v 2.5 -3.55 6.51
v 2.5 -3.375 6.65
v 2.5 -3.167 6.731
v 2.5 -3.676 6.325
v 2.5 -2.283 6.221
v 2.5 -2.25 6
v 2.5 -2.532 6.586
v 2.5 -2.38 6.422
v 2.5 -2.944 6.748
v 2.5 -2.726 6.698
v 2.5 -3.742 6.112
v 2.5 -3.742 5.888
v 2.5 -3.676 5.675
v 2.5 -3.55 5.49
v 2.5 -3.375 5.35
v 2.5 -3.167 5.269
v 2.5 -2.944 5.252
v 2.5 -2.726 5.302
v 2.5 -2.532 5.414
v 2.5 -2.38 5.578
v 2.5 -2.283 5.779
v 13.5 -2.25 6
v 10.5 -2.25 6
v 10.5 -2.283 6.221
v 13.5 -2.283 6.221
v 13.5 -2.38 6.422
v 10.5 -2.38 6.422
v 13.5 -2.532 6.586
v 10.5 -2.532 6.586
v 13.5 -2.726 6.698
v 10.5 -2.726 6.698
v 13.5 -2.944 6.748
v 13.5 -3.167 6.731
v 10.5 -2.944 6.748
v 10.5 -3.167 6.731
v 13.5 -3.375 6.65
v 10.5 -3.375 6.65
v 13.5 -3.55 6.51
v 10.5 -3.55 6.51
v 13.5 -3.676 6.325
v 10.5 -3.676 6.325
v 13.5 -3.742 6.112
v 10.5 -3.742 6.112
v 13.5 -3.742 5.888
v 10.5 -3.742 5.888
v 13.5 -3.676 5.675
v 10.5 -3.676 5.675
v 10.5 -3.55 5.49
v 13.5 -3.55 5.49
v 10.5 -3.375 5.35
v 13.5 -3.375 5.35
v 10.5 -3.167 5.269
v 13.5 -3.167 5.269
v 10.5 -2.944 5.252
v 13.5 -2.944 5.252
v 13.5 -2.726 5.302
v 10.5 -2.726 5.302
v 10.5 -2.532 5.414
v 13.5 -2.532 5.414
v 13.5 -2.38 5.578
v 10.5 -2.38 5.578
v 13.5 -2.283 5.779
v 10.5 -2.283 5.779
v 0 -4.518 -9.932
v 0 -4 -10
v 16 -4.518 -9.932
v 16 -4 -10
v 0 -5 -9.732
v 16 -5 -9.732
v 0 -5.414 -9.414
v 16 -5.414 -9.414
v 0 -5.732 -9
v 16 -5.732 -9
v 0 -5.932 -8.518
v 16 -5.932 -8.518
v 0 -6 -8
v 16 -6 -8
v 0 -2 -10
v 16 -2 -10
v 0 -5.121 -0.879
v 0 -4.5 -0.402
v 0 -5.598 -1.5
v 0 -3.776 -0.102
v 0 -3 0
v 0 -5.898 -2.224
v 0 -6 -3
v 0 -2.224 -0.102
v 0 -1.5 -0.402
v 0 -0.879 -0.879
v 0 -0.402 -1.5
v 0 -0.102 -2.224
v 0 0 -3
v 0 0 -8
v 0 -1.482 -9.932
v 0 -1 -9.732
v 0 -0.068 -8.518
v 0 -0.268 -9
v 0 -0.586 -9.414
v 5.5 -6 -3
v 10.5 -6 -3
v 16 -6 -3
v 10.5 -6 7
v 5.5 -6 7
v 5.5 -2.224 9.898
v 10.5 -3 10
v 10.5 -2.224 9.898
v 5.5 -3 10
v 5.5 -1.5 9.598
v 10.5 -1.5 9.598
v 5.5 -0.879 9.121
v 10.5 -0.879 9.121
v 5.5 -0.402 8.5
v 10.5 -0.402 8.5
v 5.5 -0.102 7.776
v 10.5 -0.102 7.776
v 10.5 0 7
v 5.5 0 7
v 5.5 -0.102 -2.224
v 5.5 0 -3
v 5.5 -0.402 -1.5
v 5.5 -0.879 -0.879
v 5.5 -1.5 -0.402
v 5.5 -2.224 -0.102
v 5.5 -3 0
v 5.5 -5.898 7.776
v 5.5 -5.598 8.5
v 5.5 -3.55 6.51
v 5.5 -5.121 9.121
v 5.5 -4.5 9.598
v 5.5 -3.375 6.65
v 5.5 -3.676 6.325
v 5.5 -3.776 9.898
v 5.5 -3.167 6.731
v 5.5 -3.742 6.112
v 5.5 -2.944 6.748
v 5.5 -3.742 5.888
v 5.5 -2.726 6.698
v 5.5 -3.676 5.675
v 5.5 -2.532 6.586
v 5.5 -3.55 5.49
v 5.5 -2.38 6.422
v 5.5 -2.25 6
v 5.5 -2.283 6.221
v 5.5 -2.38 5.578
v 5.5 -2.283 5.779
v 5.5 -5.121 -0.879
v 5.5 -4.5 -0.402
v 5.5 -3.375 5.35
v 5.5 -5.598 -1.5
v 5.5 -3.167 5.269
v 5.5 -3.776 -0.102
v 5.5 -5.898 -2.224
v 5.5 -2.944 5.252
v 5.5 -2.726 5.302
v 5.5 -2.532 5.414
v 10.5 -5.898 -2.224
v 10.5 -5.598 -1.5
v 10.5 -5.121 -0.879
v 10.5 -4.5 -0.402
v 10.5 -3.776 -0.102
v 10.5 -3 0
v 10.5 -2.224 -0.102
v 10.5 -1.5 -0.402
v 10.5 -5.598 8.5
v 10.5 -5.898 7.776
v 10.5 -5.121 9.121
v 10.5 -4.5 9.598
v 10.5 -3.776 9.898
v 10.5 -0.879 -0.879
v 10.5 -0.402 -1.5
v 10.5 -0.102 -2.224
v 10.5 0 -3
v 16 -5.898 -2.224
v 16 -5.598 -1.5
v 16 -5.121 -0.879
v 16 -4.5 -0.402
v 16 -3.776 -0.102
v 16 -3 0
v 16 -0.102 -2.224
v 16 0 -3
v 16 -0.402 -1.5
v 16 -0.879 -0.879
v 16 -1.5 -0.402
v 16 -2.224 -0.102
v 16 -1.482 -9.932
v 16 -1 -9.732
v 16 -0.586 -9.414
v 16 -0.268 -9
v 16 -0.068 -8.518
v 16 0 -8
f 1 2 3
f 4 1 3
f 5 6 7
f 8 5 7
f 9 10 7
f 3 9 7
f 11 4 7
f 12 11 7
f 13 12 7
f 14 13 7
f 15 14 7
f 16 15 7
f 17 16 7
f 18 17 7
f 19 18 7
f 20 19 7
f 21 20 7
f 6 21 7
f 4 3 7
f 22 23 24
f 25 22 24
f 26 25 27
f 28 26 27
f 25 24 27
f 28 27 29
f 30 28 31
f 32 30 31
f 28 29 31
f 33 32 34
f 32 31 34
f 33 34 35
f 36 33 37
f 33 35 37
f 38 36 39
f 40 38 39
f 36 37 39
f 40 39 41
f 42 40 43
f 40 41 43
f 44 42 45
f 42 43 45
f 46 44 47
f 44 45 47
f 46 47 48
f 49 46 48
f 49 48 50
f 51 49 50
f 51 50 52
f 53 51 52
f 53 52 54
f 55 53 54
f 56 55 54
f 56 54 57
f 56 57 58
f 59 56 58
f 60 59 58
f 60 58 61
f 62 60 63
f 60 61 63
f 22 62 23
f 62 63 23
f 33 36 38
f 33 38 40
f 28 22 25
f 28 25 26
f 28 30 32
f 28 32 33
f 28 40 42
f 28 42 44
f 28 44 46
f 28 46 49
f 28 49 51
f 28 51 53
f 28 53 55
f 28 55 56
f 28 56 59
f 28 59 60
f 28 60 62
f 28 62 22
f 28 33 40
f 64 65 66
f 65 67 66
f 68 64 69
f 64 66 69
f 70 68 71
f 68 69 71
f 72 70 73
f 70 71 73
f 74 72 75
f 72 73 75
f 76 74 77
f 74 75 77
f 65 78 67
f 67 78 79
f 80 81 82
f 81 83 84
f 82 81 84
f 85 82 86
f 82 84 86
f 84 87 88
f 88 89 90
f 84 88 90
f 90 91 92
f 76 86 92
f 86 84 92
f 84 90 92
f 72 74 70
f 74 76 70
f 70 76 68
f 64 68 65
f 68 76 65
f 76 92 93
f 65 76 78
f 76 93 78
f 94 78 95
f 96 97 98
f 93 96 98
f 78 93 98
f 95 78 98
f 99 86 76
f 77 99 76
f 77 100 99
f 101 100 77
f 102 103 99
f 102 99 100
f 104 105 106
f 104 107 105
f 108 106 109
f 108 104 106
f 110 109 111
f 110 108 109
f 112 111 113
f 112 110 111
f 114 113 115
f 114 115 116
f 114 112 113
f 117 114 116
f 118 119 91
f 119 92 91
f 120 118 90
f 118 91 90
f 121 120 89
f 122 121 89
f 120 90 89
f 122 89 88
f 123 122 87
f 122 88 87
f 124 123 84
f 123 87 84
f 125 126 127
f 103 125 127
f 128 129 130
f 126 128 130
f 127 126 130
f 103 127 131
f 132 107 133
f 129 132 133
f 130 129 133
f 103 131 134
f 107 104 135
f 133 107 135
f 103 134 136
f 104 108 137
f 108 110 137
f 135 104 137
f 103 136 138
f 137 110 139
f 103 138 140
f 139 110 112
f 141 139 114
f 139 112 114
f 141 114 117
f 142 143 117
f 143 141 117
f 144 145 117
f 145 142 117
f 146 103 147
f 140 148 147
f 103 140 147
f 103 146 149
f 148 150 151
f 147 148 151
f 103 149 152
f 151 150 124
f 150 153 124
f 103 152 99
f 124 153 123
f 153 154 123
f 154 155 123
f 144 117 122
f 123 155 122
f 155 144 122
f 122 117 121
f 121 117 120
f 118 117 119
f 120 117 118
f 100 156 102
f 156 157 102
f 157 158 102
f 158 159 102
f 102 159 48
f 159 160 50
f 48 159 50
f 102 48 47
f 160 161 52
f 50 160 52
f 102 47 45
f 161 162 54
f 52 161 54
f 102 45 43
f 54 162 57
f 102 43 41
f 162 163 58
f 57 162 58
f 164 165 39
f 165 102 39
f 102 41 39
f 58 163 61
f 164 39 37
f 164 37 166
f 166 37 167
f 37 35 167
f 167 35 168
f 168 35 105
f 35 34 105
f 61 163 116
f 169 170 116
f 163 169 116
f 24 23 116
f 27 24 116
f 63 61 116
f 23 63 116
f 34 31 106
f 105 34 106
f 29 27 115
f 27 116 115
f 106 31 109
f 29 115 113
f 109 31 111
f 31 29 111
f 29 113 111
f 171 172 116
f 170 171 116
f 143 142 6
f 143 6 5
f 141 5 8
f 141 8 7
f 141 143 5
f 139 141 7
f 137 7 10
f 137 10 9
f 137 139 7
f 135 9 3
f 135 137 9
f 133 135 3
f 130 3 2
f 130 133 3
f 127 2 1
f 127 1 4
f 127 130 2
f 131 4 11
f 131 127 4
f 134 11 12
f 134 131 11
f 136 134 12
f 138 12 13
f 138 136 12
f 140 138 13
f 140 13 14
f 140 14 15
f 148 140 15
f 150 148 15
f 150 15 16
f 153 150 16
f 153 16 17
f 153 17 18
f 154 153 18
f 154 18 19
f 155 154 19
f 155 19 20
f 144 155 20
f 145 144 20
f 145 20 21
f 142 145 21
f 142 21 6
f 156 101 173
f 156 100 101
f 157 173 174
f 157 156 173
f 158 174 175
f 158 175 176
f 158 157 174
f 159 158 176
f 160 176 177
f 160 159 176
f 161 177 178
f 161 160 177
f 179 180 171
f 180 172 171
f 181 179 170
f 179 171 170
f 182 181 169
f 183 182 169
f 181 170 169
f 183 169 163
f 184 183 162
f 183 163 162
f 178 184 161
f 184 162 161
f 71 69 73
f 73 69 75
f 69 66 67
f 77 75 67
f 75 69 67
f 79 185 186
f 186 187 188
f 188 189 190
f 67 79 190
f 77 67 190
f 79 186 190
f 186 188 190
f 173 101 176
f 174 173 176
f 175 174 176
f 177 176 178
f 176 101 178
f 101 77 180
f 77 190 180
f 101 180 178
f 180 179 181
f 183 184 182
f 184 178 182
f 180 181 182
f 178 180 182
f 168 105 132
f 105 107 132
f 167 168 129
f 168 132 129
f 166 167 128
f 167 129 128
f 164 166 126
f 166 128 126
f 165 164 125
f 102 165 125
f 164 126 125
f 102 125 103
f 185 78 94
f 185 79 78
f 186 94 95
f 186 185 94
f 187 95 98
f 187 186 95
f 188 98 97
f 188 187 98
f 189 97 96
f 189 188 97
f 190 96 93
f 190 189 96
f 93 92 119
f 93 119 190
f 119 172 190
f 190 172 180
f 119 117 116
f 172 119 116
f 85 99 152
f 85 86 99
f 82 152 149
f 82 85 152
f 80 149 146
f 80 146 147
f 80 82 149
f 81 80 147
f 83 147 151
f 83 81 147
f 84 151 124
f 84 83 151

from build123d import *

# Parameters (mm, degrees)
F1_DEPTH      = 6
F2_R          = 0.75
F3_DEPTH      = 3
F3_DEPTH_BACK = 8
F4_R          = 2.99999
F5_R          = 2.99999
F6_R          = 2


# Not quite as in the source:
# - a fillet or chamfer is up to 0.001 mm smaller than in the source, because OpenCascade refuses the exact size


with BuildPart() as f1:
    # F0 (on Front) → F1 (new body)
    with BuildSketch(Plane.XZ):
        Polygon((5.5, 0), (0, 0), (0, -10), (16, -10), (16, 0), (10.5, 0), (10.5, 10), (5.5, 10), align=None)
    extrude(amount=F1_DEPTH)

    # F2 (on face) → F3 (join, two sides)
    with BuildSketch(Plane.YZ.offset(10.5)) as f3_sk:
        with Locations((-3, 6)):
            Circle(F2_R)
    extrude(amount=F3_DEPTH)
    extrude(f3_sk.sketch, amount=-F3_DEPTH_BACK)

    # F4 (radius 3 in the source; OpenCascade refuses exactly that, so slightly less here)
    f4_edges = [f1.edges().sort_by_distance(p)[0] for p in [
        (8, -6, 10),
        (8, 0, 10),
    ]]
    fillet(f4_edges, radius=F4_R)

    # F5 (radius 3 in the source; OpenCascade refuses exactly that, so slightly less here)
    f5_edges = [f1.edges().sort_by_distance(p)[0] for p in [
        (2.75, -6, 0),
        (2.75, 0, 0),
        (13.25, -6, 0),
        (13.25, 0, 0),
    ]]
    fillet(f5_edges, radius=F5_R)

    # F6
    f6_edges = [f1.edges().sort_by_distance(p)[0] for p in [
        (8, -6, -10),
        (8, 0, -10),
    ]]
    fillet(f6_edges, radius=F6_R)


solid = f1.part
